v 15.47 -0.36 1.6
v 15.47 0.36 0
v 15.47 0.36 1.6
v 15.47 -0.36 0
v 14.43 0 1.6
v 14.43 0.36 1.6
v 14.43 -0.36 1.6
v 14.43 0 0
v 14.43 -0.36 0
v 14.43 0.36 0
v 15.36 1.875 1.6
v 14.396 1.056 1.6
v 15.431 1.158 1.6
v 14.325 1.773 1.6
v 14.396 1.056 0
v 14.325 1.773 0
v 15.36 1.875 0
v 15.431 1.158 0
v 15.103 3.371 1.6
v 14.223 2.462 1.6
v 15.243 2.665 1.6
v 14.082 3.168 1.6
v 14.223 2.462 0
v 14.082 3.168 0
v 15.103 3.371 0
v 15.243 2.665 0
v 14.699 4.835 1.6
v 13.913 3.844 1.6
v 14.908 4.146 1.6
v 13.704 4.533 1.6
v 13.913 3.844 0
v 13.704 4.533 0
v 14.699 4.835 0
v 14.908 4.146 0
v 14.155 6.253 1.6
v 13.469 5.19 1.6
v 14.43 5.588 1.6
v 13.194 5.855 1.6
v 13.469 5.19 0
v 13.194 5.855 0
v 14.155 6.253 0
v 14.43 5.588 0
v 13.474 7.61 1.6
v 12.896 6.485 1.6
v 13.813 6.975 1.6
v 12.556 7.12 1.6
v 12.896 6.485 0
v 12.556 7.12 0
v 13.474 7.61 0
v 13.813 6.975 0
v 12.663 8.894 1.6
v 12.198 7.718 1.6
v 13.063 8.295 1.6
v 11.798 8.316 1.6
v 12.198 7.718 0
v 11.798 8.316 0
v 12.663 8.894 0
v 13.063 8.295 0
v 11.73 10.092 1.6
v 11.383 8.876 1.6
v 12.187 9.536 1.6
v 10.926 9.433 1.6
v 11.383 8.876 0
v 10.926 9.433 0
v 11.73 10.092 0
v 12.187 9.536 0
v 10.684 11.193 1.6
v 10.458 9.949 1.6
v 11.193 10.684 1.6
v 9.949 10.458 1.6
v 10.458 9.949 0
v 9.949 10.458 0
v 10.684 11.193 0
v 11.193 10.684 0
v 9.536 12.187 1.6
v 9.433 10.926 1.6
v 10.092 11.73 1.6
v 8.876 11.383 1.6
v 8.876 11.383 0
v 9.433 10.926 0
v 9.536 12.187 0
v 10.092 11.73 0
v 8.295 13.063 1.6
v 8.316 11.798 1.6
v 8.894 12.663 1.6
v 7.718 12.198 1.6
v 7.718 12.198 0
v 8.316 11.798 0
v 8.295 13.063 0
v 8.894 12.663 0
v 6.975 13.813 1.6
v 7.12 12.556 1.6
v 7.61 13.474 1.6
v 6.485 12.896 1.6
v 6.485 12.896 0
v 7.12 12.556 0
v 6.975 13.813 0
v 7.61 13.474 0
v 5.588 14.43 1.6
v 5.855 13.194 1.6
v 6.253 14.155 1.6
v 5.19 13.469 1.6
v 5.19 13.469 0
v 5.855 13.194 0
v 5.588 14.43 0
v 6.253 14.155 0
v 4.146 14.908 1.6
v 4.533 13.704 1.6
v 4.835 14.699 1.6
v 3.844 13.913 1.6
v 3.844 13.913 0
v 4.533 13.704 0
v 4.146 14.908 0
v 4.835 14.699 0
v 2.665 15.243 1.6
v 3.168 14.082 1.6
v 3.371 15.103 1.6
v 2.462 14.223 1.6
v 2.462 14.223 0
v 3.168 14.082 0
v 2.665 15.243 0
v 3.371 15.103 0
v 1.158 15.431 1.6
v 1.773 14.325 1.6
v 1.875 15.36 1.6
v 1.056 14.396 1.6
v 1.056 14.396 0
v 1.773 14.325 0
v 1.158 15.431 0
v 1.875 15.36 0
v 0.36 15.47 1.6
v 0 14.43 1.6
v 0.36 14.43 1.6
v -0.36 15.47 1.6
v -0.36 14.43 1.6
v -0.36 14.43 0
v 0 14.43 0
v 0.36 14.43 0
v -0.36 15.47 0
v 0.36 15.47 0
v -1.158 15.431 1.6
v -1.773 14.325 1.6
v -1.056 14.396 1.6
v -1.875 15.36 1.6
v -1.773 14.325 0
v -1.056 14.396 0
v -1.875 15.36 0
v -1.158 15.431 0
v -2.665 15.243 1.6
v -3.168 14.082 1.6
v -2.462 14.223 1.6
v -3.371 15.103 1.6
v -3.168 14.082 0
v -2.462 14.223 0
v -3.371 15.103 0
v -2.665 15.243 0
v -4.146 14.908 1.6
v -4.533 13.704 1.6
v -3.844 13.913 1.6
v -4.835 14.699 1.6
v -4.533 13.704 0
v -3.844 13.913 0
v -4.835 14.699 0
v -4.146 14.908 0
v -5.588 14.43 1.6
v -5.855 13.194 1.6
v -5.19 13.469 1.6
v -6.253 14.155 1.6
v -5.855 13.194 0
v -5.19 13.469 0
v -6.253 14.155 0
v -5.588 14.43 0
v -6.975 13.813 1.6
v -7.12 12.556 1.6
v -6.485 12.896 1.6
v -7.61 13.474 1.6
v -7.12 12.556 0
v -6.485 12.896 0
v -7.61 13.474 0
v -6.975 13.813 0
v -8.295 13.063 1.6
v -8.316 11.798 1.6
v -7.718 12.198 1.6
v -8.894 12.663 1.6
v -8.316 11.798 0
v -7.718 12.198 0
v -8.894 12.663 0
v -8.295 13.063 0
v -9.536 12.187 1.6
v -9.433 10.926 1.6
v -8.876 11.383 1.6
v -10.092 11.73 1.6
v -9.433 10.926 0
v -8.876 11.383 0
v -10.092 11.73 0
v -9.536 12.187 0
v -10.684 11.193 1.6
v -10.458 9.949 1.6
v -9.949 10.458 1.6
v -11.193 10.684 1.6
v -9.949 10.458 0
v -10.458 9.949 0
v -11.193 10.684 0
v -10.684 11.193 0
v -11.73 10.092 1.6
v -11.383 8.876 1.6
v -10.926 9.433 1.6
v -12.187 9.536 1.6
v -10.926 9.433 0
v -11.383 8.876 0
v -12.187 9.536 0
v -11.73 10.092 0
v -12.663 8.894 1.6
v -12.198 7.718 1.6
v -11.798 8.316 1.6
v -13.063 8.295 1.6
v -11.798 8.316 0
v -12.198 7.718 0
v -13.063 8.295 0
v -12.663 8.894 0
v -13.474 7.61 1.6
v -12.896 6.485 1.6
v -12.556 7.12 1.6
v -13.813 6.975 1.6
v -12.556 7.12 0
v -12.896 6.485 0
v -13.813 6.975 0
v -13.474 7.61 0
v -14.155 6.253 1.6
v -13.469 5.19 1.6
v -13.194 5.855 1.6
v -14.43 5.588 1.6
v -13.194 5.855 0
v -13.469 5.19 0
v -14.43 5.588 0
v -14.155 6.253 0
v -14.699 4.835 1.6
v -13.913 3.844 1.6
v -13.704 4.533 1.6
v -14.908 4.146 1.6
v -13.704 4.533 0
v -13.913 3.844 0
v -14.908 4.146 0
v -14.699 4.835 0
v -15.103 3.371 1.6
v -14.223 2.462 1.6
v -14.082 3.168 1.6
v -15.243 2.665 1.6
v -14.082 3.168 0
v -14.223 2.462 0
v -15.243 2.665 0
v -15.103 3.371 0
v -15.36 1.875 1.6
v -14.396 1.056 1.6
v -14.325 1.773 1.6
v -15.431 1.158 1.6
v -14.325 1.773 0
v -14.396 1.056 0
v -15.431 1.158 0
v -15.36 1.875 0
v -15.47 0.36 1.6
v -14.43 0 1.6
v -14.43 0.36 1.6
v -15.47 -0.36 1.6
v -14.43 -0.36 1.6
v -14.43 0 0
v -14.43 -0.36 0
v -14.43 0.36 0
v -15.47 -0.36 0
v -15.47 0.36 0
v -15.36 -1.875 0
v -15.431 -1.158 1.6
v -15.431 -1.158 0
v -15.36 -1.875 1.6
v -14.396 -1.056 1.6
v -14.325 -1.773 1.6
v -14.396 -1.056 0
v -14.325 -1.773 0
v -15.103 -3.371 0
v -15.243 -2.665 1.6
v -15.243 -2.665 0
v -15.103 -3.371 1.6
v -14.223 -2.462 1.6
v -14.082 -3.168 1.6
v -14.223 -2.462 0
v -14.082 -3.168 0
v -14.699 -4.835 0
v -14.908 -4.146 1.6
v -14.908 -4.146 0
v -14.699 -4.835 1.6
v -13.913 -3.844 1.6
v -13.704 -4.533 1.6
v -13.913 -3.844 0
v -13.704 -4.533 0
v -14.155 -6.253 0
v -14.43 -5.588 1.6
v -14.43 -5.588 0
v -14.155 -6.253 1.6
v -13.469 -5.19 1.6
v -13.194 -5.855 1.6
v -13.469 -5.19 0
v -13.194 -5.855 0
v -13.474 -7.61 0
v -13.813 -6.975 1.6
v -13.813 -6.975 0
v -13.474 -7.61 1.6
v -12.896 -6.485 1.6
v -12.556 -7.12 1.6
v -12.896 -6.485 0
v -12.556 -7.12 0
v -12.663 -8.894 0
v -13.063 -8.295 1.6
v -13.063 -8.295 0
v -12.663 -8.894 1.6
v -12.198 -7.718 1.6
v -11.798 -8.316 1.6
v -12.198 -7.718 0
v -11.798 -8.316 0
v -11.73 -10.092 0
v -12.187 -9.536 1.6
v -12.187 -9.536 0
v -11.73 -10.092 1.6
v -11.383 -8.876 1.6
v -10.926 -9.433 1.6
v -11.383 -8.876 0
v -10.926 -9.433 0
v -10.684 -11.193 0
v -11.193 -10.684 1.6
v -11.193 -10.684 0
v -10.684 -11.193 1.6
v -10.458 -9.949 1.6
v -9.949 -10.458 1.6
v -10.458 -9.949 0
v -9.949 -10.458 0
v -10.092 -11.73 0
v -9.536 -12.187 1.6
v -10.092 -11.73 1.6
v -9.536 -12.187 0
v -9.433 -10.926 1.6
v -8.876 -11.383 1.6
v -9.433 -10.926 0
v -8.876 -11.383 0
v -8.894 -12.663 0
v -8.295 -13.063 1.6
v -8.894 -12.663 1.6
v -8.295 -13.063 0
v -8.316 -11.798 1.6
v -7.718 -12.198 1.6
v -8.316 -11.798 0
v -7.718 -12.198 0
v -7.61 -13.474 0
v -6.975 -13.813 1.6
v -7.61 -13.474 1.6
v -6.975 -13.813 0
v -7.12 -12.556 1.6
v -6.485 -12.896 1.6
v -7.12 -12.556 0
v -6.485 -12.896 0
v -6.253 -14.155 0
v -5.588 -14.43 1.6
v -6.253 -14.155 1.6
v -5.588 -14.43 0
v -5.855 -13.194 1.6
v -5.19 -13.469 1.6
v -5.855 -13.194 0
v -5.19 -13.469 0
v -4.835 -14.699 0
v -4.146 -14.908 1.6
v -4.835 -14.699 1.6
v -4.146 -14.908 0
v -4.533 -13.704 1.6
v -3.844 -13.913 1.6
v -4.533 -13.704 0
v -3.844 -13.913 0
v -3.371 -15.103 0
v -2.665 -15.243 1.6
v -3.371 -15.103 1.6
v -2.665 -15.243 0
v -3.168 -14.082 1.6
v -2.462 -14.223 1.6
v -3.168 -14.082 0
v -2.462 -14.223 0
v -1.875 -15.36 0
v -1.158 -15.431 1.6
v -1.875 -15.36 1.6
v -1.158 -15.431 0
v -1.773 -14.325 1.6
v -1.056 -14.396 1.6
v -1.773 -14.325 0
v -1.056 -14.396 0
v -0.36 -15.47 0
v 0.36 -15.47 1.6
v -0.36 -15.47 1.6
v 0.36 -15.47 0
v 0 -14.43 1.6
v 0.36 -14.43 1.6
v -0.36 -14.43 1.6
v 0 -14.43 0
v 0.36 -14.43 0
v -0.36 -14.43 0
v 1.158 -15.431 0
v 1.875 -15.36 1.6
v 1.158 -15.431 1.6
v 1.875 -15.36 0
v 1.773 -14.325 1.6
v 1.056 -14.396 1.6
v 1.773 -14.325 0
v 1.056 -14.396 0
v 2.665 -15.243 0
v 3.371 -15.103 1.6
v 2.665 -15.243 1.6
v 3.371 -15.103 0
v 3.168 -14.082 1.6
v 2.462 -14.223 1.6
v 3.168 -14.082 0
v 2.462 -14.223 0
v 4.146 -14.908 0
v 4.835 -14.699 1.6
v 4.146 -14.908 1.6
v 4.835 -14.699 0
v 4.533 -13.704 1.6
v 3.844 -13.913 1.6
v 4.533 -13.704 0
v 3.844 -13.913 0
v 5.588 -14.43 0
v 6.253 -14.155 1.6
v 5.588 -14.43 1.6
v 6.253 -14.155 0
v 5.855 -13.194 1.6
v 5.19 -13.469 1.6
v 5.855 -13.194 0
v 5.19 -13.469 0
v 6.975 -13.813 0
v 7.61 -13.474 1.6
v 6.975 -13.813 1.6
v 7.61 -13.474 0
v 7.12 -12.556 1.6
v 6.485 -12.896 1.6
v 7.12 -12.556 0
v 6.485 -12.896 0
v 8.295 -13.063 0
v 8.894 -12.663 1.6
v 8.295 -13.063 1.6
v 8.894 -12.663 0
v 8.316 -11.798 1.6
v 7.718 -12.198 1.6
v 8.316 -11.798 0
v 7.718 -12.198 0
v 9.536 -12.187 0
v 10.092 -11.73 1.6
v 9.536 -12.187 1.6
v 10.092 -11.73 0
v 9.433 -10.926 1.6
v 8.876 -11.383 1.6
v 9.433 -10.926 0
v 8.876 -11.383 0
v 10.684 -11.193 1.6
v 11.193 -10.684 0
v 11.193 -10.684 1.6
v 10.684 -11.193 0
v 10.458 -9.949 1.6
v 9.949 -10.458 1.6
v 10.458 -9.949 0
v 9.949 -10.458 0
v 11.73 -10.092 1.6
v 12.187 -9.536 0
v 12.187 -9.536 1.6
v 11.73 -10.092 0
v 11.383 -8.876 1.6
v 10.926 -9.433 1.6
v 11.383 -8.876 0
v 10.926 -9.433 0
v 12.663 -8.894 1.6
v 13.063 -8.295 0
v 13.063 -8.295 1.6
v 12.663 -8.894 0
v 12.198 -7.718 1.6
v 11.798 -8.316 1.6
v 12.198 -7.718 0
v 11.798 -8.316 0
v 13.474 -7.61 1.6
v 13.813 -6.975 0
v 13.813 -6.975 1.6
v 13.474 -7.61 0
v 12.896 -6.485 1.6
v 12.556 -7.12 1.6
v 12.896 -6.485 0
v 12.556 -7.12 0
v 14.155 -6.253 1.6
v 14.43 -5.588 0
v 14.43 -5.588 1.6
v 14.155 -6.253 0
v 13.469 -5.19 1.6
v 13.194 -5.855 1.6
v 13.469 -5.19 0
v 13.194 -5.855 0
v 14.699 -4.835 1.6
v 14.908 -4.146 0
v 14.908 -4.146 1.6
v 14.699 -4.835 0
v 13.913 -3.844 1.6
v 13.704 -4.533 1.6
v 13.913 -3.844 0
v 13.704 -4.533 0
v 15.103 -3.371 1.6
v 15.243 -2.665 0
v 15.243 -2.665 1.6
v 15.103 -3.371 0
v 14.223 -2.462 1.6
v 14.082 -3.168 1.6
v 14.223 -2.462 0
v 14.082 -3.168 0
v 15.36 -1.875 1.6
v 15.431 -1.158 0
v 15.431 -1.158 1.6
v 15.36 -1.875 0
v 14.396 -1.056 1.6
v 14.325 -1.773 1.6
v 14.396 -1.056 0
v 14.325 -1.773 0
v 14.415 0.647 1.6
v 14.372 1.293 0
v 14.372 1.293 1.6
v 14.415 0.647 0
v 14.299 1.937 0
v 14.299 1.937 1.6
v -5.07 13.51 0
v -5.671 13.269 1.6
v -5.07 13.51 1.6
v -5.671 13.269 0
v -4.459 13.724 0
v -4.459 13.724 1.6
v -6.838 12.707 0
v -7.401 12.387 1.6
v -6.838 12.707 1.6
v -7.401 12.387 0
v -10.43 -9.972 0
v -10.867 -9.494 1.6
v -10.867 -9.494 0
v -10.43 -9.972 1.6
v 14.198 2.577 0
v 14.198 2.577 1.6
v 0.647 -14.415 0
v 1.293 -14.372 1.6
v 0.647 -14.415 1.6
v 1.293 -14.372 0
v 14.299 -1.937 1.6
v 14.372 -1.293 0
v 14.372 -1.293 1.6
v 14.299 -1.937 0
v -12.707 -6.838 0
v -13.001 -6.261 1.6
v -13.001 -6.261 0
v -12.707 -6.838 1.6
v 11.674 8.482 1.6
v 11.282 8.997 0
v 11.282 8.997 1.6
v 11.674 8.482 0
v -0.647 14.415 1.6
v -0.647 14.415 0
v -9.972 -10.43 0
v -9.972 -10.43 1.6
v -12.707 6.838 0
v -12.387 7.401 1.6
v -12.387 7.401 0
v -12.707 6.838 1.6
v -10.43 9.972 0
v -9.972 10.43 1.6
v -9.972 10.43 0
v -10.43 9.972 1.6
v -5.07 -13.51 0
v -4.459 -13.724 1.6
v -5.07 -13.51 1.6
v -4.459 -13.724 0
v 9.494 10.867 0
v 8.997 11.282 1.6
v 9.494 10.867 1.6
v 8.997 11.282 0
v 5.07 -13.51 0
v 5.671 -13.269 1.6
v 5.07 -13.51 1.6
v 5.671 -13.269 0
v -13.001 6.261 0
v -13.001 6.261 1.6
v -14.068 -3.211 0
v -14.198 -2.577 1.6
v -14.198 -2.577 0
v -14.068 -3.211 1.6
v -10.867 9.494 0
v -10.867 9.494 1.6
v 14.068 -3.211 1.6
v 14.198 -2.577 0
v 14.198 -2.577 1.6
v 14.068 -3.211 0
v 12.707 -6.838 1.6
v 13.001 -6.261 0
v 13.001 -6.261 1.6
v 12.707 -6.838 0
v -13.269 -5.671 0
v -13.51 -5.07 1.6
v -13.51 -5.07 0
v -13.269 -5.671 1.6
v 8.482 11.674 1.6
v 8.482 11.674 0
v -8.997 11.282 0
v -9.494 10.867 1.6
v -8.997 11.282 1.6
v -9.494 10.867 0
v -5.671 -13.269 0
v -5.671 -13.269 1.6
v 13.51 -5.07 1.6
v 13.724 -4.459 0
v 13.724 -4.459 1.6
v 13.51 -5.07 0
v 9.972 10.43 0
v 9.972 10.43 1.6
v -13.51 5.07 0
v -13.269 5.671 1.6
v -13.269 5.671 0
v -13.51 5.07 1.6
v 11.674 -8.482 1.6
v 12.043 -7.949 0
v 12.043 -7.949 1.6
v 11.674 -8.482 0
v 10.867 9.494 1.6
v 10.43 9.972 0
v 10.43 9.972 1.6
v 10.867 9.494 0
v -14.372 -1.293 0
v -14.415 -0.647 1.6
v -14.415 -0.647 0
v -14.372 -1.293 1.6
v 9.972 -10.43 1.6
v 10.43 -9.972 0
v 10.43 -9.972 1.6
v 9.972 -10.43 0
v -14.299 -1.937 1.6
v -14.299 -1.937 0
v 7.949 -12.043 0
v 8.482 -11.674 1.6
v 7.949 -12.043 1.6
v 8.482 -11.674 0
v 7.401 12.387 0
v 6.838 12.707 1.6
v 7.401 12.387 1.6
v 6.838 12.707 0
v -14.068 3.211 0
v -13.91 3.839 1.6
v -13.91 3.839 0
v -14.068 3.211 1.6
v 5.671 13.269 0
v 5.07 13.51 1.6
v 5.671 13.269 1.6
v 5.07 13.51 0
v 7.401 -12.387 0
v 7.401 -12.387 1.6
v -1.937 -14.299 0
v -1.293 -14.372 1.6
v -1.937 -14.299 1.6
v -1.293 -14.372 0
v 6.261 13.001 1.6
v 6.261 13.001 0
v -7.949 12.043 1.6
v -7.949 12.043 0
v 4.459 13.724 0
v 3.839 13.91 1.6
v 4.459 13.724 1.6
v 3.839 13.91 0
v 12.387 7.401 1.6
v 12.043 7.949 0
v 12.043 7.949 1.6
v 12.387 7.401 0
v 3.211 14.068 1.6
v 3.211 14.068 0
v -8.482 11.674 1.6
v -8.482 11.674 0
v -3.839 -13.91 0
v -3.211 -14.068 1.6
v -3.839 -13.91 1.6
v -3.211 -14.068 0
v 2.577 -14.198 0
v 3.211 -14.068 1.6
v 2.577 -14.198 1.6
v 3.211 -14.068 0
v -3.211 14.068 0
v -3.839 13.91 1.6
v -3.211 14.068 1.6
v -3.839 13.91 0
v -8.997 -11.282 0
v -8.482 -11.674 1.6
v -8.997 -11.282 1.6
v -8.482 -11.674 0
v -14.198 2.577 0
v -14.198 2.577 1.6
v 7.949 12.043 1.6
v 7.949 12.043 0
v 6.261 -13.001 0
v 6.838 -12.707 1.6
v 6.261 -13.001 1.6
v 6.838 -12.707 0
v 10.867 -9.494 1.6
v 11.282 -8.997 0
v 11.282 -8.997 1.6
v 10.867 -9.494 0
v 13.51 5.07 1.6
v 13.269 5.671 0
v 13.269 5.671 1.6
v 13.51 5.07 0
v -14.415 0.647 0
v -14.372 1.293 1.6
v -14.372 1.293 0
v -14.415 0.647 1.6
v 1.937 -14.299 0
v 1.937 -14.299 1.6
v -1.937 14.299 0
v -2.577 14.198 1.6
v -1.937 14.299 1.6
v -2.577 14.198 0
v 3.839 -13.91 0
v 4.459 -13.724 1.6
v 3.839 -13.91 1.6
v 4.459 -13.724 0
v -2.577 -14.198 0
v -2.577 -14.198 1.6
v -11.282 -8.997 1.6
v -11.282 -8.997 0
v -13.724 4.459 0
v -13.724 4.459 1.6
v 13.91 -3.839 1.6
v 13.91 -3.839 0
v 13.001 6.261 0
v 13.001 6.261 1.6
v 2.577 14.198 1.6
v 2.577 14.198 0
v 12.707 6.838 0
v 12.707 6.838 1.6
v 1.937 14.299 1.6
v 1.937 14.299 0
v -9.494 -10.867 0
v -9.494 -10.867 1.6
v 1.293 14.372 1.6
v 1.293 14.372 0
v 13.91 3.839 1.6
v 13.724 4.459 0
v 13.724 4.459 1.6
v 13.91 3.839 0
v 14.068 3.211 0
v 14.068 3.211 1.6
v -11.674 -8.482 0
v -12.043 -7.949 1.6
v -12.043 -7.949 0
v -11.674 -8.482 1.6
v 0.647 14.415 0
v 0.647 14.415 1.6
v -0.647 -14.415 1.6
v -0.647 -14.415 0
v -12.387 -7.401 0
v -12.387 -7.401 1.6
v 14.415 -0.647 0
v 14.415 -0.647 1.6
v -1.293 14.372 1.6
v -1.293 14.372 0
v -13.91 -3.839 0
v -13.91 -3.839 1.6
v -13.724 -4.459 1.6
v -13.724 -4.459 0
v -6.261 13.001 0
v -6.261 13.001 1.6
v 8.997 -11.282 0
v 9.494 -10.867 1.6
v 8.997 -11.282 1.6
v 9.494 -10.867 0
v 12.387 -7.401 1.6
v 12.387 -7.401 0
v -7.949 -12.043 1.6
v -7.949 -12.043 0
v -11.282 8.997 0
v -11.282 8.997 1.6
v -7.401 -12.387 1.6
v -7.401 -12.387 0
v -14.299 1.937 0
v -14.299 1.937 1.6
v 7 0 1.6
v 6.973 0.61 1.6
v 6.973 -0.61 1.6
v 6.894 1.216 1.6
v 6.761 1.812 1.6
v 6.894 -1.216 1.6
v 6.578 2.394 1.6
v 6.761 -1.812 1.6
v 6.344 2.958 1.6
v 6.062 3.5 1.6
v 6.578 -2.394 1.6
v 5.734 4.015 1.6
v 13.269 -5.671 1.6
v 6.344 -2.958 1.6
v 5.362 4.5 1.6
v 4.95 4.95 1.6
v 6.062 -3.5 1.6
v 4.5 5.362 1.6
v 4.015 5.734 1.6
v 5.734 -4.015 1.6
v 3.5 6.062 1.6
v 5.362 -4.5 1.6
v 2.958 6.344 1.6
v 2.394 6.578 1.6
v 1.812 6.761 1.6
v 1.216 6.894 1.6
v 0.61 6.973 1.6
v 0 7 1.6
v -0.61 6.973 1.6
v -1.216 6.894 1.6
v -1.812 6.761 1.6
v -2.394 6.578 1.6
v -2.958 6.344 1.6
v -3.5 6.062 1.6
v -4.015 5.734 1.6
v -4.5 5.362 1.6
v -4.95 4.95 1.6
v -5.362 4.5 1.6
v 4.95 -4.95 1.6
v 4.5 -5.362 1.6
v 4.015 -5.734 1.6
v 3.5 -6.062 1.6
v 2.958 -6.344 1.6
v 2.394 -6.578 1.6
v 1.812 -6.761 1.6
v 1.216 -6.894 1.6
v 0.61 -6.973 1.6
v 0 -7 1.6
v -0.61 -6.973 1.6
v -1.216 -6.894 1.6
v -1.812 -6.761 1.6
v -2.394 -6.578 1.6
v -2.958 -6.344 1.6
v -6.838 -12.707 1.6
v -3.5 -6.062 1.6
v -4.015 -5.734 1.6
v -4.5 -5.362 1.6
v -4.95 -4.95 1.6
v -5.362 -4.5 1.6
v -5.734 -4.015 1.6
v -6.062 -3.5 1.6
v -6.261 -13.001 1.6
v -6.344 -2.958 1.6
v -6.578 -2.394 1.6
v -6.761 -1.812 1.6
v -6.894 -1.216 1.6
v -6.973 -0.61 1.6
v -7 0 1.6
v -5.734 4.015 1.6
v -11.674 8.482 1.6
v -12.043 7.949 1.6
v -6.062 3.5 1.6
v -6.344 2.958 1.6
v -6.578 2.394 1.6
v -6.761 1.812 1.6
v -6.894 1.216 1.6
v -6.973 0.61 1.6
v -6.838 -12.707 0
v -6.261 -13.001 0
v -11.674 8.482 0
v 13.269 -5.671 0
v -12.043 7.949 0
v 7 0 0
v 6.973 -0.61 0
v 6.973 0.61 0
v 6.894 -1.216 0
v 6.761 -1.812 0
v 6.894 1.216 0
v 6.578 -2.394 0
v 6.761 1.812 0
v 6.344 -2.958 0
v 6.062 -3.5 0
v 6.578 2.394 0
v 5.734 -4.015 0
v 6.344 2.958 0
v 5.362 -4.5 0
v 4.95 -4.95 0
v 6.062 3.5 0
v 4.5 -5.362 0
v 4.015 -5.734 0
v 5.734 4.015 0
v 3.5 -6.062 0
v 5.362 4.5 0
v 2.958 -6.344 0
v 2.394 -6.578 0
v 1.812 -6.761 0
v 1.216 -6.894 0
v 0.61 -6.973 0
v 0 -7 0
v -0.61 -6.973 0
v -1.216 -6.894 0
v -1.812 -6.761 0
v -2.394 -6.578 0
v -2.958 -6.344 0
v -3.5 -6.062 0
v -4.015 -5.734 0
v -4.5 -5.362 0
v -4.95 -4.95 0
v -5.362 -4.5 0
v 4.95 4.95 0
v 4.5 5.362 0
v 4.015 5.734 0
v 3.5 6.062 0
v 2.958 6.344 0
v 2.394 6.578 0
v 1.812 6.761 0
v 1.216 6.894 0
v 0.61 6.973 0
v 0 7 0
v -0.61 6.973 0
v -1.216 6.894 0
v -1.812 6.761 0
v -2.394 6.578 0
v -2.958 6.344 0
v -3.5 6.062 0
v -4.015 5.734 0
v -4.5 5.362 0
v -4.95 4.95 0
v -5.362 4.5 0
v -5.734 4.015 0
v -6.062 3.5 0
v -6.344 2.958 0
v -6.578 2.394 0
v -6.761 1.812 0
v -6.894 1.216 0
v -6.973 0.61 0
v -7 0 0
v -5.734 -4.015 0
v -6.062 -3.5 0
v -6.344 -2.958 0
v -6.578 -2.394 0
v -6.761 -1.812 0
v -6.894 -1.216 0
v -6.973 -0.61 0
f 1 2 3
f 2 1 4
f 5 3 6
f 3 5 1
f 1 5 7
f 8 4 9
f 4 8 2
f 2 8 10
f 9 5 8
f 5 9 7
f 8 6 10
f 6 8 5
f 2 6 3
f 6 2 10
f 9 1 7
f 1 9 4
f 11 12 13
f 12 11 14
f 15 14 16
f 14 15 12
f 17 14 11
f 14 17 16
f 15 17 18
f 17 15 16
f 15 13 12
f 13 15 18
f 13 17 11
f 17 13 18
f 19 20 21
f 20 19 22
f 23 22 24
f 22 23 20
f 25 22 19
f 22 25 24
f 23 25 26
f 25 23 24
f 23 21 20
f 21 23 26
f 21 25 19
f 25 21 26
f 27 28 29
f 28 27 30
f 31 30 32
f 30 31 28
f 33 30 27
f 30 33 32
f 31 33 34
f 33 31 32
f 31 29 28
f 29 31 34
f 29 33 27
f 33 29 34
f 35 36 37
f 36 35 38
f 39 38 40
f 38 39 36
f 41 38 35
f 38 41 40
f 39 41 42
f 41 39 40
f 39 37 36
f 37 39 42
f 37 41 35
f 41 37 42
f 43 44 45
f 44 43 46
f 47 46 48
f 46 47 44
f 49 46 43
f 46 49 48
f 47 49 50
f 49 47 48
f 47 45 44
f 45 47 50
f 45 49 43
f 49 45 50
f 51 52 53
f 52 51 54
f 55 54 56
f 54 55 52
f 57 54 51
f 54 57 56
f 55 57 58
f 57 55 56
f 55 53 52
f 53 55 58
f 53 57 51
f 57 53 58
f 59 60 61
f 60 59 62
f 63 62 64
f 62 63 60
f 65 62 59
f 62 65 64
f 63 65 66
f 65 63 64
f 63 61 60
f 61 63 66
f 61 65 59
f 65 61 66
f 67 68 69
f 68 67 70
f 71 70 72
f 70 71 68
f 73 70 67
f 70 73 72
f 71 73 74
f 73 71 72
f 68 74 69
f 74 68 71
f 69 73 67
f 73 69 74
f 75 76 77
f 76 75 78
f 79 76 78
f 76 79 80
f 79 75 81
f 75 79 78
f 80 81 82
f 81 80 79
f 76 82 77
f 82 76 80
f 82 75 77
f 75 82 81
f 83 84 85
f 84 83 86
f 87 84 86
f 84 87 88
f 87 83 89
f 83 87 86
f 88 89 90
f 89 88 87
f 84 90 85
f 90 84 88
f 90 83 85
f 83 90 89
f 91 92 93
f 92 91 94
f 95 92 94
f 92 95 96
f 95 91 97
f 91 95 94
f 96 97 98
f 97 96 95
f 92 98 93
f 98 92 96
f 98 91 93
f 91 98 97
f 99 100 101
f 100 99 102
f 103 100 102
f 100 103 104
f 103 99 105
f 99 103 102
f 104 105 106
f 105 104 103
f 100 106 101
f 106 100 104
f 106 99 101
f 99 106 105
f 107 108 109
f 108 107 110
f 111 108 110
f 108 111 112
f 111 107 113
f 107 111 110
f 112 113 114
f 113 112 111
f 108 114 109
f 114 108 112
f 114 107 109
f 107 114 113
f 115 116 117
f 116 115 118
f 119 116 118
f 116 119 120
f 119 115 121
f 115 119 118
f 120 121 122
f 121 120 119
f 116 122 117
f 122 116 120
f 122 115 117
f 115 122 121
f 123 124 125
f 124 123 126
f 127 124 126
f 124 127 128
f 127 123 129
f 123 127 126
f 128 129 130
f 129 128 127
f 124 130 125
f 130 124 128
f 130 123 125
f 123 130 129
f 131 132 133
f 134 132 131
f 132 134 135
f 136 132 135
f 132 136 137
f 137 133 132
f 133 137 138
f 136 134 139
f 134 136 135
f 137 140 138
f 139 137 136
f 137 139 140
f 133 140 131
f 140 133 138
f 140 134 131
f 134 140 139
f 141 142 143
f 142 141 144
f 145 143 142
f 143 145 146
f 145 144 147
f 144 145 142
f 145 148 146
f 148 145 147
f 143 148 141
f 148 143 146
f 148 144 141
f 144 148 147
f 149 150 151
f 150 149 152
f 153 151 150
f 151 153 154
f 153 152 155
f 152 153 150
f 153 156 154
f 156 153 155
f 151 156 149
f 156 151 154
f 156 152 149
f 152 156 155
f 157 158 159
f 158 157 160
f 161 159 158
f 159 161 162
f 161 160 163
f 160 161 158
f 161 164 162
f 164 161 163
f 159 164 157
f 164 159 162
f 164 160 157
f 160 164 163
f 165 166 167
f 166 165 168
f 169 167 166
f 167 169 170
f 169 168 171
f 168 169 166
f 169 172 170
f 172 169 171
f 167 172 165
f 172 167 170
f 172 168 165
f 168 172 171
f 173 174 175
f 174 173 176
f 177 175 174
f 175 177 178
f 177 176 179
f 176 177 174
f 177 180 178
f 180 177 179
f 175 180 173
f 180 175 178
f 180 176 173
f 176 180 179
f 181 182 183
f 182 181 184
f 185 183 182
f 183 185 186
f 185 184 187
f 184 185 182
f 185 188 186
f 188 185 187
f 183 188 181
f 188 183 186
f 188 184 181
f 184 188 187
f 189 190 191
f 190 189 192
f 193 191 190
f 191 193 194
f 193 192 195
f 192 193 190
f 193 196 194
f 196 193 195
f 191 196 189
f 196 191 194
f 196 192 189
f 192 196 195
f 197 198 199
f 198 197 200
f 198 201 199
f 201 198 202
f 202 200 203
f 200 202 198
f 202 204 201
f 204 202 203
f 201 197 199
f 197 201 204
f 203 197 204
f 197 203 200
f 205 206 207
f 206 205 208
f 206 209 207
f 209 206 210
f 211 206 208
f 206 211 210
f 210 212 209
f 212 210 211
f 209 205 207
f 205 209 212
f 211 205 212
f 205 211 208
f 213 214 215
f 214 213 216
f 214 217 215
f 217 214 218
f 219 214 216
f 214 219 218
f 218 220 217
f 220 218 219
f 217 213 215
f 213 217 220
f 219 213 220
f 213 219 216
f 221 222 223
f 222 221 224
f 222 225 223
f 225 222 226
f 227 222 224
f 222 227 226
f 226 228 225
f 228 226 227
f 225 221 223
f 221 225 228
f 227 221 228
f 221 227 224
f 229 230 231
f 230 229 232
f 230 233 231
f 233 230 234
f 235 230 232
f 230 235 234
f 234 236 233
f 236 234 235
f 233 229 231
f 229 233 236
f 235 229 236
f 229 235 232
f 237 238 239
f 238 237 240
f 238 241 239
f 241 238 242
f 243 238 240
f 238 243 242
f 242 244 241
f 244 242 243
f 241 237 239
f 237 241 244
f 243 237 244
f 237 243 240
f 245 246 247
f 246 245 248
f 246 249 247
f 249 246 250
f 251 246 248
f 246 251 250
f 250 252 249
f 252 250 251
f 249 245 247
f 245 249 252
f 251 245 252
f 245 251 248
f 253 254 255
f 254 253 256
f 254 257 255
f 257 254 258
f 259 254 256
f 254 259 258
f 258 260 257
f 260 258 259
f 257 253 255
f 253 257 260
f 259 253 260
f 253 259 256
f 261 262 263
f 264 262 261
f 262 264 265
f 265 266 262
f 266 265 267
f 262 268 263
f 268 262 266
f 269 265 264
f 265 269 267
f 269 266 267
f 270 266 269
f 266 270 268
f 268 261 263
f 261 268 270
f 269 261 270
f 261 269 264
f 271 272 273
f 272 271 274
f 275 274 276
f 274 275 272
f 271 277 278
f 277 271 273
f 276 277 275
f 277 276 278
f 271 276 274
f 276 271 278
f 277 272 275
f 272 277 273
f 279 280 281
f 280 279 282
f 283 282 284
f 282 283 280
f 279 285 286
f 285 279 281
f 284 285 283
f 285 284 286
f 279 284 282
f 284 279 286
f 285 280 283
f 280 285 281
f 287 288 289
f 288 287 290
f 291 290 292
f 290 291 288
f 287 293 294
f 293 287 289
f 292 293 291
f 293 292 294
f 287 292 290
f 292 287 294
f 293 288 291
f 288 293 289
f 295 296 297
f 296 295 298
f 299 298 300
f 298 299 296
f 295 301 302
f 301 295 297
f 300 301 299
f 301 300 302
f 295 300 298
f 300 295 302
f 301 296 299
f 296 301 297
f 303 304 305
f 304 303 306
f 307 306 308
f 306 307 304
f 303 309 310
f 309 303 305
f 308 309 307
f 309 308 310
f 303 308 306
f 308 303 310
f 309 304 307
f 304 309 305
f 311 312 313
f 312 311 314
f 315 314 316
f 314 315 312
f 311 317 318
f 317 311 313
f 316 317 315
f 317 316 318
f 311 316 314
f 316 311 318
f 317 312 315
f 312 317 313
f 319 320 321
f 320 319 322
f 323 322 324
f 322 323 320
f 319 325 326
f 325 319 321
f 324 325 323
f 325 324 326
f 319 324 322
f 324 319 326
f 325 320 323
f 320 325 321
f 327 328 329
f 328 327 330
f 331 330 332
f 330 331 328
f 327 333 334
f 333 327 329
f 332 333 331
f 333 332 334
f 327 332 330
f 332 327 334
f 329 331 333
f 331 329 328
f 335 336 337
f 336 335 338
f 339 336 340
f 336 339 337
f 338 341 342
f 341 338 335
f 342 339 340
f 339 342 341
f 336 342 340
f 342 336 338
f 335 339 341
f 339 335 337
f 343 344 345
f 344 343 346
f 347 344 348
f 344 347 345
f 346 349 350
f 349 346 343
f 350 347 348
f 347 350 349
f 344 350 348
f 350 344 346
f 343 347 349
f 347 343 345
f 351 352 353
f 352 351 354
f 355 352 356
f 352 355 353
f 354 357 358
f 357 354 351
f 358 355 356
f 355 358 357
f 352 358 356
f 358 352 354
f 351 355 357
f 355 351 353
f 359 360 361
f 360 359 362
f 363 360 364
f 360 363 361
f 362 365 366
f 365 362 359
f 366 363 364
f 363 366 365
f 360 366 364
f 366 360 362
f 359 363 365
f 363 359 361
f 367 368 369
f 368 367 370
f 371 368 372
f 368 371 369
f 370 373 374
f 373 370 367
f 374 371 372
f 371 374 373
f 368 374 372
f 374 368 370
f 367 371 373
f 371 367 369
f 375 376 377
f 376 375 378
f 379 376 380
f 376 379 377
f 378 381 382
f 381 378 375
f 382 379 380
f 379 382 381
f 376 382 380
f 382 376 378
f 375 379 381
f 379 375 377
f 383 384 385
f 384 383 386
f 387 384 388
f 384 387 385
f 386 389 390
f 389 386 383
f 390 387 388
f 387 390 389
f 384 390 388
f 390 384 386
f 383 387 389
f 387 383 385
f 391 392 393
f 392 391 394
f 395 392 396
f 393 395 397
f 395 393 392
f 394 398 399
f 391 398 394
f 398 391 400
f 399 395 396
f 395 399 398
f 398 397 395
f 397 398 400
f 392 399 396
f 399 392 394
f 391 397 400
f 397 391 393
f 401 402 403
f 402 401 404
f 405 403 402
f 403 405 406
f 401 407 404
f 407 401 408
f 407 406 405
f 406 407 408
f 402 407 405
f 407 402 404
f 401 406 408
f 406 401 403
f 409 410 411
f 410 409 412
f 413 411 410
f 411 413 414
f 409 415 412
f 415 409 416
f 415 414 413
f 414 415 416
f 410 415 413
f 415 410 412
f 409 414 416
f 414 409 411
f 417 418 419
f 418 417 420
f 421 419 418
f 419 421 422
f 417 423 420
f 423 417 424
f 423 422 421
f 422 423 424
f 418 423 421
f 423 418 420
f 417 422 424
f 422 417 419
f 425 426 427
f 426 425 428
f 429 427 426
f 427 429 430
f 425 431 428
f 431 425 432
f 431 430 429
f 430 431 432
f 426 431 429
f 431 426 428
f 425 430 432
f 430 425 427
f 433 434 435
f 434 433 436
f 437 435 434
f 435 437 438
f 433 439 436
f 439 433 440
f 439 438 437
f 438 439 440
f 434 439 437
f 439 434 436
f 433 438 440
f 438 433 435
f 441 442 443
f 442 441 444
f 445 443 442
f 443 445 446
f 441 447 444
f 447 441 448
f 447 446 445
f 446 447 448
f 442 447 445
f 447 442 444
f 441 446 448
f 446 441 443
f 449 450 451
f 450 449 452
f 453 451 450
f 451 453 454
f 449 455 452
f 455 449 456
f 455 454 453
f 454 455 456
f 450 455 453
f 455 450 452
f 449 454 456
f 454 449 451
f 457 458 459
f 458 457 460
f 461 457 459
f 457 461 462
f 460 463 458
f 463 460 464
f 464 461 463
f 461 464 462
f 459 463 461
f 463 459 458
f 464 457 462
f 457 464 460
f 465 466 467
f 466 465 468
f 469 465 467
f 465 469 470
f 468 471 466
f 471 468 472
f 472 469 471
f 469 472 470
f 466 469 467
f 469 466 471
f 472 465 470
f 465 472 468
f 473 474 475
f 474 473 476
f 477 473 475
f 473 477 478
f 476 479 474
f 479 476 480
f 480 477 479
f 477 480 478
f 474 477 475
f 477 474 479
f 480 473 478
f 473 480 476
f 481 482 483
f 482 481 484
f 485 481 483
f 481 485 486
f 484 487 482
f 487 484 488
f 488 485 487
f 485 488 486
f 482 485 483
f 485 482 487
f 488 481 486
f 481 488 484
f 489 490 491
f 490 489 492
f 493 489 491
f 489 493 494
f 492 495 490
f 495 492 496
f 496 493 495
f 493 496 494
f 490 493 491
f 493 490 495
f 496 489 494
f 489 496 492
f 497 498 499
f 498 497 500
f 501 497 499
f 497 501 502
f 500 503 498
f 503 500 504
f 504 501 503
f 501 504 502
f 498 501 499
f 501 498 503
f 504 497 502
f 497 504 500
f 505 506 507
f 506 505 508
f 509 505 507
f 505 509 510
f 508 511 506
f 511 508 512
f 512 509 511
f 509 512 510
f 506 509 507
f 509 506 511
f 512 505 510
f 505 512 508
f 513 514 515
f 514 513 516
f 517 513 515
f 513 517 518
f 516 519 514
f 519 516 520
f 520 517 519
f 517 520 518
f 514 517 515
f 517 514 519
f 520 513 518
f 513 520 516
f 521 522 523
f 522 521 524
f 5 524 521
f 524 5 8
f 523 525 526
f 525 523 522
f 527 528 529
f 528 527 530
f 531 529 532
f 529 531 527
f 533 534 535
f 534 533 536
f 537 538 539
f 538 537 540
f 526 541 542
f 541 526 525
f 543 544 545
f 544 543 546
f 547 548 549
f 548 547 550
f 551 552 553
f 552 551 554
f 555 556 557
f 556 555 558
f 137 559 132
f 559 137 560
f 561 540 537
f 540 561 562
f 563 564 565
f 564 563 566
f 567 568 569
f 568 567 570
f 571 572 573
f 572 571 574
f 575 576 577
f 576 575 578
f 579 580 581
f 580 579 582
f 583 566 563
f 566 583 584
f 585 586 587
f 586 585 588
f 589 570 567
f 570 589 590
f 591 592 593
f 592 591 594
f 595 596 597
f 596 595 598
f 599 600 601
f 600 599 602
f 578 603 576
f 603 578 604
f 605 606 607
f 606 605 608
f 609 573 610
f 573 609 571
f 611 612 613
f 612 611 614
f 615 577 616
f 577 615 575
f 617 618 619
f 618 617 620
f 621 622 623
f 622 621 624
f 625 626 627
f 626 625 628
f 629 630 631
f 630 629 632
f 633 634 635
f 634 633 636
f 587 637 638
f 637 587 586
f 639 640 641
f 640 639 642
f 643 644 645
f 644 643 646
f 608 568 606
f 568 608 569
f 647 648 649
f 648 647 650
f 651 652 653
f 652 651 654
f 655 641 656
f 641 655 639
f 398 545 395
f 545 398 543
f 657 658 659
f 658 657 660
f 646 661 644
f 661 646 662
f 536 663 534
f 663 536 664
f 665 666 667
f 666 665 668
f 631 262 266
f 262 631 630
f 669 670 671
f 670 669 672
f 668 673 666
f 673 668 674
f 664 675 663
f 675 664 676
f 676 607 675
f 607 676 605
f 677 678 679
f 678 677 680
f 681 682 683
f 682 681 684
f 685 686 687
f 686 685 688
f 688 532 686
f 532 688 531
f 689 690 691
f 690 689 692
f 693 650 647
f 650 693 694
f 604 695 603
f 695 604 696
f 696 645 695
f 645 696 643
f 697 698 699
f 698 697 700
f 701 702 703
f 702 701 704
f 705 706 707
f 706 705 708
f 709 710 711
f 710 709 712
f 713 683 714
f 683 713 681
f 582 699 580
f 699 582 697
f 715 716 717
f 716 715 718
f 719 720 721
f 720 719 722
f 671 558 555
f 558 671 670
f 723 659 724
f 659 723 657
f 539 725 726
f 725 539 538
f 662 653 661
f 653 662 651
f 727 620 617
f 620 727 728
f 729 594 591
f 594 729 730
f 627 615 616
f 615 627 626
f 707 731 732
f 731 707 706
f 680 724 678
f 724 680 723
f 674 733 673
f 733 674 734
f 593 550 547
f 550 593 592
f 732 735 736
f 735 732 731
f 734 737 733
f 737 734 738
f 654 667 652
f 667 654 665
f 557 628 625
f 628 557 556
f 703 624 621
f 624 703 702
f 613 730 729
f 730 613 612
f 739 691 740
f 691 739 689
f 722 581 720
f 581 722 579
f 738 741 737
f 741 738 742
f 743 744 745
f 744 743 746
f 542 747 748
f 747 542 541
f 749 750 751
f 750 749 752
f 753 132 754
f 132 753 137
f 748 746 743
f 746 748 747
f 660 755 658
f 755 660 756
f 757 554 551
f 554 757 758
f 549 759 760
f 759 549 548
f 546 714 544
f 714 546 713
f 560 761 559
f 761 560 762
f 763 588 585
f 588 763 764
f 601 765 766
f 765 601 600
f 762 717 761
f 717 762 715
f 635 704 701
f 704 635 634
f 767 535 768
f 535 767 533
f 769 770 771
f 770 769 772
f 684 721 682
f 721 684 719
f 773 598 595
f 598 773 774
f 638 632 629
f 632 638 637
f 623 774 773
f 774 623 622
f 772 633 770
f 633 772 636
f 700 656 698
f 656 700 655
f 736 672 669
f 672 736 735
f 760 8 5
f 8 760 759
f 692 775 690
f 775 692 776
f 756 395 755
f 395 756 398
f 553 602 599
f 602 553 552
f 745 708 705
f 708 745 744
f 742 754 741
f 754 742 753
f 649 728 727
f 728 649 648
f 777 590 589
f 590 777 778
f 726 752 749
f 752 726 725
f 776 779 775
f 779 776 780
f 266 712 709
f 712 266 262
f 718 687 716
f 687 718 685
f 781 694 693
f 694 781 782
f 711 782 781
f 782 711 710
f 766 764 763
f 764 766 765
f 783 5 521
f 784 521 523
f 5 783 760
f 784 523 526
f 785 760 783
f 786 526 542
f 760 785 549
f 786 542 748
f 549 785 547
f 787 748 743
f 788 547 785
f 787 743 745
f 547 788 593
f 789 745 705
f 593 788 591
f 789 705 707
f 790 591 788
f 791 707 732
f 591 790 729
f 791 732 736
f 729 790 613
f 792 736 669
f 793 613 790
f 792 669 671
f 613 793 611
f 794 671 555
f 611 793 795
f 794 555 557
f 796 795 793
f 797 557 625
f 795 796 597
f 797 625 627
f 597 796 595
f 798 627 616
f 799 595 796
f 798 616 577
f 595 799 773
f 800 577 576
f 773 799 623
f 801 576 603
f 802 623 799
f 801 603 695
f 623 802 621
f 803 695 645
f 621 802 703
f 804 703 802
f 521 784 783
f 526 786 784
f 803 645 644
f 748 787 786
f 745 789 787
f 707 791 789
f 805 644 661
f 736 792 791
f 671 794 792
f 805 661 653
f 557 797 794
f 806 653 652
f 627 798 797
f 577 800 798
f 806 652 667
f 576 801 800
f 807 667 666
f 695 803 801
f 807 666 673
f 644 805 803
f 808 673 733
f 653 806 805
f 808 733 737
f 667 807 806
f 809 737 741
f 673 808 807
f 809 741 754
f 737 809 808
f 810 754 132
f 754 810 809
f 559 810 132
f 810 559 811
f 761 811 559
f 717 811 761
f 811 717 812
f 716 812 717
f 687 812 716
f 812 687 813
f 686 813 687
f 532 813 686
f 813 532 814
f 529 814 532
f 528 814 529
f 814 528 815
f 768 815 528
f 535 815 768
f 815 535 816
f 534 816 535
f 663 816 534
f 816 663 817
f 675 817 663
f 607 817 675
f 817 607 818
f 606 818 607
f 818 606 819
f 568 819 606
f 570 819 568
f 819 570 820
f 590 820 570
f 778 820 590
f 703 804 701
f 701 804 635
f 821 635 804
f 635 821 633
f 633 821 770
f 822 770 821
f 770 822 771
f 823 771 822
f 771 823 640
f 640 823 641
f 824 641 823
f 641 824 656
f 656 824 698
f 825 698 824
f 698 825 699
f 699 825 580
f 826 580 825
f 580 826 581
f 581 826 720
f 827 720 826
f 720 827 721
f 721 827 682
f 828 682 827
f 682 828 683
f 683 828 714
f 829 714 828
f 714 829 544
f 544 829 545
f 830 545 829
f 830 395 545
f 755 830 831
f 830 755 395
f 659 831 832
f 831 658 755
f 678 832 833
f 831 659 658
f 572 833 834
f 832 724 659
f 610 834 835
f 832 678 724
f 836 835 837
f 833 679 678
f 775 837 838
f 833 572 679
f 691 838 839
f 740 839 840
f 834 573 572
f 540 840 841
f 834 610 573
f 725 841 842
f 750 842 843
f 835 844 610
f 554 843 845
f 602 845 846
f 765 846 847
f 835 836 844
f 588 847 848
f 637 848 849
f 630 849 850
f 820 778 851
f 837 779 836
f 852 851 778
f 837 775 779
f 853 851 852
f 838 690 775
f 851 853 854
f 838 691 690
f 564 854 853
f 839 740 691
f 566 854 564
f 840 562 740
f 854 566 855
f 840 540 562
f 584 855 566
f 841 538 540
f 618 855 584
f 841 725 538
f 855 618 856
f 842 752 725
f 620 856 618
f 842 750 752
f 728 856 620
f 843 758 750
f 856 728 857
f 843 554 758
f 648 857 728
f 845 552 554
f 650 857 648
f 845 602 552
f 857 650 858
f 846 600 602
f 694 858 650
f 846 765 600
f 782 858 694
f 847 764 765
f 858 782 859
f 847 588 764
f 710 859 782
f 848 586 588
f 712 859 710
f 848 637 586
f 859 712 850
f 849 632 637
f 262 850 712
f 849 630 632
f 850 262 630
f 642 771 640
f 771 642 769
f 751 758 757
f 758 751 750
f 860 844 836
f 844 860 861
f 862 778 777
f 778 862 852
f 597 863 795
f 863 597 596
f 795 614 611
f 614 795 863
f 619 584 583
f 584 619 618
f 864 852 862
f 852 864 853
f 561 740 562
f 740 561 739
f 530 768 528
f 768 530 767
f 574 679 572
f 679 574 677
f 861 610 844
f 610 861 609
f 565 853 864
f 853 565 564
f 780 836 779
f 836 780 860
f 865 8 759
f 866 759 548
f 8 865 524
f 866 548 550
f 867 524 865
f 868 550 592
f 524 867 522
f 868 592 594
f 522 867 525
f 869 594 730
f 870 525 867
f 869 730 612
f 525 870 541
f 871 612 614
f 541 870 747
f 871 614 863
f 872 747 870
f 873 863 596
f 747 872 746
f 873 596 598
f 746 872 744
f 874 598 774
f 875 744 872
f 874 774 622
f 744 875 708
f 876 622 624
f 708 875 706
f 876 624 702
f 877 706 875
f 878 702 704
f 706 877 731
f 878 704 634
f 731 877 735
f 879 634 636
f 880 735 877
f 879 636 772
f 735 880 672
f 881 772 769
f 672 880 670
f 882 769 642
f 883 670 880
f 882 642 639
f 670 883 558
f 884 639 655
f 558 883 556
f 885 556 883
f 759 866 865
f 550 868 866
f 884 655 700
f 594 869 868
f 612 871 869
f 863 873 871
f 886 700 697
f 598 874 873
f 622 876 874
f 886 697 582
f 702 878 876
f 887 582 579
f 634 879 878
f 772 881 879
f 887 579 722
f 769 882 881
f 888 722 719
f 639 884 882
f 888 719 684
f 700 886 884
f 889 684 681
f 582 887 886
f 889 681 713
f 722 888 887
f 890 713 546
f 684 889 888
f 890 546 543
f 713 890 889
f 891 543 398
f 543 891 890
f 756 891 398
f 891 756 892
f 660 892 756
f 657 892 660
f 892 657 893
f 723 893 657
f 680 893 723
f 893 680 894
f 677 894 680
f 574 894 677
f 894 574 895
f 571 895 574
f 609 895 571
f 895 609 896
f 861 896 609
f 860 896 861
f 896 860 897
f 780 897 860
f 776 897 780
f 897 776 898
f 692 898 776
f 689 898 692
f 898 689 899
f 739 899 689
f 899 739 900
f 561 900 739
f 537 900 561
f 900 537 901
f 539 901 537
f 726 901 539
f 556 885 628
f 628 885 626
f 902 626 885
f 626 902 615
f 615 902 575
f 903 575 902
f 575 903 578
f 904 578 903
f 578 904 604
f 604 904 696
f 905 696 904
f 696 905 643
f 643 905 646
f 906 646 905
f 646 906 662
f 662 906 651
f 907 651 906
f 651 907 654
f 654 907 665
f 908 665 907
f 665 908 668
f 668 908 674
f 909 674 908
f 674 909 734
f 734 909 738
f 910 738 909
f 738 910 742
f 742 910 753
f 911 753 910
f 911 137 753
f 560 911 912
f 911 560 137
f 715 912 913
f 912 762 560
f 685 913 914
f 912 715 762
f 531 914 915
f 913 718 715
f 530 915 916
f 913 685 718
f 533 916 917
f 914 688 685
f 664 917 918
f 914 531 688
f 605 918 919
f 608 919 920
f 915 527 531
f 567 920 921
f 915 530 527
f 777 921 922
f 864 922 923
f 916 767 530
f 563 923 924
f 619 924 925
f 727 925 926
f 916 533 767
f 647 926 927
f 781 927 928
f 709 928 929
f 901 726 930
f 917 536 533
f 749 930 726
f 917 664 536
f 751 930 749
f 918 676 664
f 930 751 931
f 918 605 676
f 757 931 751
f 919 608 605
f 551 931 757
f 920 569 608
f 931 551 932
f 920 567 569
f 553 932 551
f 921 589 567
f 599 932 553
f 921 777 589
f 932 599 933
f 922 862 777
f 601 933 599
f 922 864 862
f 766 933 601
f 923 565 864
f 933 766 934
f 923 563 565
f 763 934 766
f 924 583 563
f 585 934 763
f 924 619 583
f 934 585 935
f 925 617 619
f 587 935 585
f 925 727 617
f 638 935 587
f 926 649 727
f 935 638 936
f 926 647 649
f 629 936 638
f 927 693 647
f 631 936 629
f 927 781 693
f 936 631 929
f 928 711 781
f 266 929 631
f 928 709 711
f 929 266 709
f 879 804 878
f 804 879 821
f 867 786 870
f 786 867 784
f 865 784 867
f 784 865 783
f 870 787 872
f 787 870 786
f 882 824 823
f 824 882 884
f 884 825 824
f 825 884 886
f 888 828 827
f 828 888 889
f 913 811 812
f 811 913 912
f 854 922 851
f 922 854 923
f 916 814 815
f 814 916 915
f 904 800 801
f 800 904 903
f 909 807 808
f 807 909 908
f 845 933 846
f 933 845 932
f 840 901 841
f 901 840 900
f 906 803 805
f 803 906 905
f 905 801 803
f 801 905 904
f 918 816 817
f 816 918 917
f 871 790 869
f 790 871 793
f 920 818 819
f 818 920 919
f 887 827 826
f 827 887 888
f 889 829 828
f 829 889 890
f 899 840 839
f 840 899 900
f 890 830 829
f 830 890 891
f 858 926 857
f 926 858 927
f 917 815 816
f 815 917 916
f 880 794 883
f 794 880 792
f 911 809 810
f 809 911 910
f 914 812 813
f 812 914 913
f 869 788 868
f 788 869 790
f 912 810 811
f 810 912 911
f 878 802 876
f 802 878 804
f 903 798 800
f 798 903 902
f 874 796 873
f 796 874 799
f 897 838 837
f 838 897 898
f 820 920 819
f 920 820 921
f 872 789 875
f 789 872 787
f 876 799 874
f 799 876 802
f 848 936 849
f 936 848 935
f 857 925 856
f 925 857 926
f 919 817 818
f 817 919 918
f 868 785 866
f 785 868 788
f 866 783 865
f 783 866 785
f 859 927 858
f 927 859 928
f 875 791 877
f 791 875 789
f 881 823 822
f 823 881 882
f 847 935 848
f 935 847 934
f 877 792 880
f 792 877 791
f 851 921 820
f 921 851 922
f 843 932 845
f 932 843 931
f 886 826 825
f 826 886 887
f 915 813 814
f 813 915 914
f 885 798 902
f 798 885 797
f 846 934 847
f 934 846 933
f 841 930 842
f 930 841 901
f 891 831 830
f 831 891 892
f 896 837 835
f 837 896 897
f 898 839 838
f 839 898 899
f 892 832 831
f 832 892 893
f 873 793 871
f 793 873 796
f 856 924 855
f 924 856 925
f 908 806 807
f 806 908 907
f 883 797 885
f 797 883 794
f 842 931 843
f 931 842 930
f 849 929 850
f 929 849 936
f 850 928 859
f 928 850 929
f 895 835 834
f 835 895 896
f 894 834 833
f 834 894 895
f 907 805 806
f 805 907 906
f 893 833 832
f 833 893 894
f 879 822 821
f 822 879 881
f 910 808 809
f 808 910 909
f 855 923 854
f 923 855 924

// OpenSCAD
// part_id: jup5
// name: Jupiter pointer drive gear
// source_drawing_ids: DRW-012
// units: mm
// revision: 0.1
// SPDX-License-Identifier: MIT

module jup5_tooth_ring(root_d = 28.86, tip_d = 30.94, tooth_count = 64, thickness = 1.6, tooth_w = 0.72) {
    union() {
        cylinder(d = root_d, h = thickness, center = false, $fn = 140);
        for (a = [0 : 360 / tooth_count : 360 - 360 / tooth_count]) {
            rotate([0, 0, a])
                translate([root_d / 2, -tooth_w / 2, 0])
                    cube([(tip_d - root_d) / 2, tooth_w, thickness], center = false);
        }
    }
}

module part_jup5(
    root_d = 28.86,
    tip_d = 30.94,
    tooth_count = 64,
    thickness = 1.6,
    bore_d = 14.0
) {
    difference() {
        jup5_tooth_ring(root_d = root_d, tip_d = tip_d, tooth_count = tooth_count, thickness = thickness);
        translate([0, 0, -0.05]) cylinder(d = bore_d, h = thickness + 0.1, center = false, $fn = 72);
    }
}

// ---- "main guard" ----
// Default to previewing when opened directly:
if (is_undef(__LIB_MODE__)) {
    part_jup5();
}
